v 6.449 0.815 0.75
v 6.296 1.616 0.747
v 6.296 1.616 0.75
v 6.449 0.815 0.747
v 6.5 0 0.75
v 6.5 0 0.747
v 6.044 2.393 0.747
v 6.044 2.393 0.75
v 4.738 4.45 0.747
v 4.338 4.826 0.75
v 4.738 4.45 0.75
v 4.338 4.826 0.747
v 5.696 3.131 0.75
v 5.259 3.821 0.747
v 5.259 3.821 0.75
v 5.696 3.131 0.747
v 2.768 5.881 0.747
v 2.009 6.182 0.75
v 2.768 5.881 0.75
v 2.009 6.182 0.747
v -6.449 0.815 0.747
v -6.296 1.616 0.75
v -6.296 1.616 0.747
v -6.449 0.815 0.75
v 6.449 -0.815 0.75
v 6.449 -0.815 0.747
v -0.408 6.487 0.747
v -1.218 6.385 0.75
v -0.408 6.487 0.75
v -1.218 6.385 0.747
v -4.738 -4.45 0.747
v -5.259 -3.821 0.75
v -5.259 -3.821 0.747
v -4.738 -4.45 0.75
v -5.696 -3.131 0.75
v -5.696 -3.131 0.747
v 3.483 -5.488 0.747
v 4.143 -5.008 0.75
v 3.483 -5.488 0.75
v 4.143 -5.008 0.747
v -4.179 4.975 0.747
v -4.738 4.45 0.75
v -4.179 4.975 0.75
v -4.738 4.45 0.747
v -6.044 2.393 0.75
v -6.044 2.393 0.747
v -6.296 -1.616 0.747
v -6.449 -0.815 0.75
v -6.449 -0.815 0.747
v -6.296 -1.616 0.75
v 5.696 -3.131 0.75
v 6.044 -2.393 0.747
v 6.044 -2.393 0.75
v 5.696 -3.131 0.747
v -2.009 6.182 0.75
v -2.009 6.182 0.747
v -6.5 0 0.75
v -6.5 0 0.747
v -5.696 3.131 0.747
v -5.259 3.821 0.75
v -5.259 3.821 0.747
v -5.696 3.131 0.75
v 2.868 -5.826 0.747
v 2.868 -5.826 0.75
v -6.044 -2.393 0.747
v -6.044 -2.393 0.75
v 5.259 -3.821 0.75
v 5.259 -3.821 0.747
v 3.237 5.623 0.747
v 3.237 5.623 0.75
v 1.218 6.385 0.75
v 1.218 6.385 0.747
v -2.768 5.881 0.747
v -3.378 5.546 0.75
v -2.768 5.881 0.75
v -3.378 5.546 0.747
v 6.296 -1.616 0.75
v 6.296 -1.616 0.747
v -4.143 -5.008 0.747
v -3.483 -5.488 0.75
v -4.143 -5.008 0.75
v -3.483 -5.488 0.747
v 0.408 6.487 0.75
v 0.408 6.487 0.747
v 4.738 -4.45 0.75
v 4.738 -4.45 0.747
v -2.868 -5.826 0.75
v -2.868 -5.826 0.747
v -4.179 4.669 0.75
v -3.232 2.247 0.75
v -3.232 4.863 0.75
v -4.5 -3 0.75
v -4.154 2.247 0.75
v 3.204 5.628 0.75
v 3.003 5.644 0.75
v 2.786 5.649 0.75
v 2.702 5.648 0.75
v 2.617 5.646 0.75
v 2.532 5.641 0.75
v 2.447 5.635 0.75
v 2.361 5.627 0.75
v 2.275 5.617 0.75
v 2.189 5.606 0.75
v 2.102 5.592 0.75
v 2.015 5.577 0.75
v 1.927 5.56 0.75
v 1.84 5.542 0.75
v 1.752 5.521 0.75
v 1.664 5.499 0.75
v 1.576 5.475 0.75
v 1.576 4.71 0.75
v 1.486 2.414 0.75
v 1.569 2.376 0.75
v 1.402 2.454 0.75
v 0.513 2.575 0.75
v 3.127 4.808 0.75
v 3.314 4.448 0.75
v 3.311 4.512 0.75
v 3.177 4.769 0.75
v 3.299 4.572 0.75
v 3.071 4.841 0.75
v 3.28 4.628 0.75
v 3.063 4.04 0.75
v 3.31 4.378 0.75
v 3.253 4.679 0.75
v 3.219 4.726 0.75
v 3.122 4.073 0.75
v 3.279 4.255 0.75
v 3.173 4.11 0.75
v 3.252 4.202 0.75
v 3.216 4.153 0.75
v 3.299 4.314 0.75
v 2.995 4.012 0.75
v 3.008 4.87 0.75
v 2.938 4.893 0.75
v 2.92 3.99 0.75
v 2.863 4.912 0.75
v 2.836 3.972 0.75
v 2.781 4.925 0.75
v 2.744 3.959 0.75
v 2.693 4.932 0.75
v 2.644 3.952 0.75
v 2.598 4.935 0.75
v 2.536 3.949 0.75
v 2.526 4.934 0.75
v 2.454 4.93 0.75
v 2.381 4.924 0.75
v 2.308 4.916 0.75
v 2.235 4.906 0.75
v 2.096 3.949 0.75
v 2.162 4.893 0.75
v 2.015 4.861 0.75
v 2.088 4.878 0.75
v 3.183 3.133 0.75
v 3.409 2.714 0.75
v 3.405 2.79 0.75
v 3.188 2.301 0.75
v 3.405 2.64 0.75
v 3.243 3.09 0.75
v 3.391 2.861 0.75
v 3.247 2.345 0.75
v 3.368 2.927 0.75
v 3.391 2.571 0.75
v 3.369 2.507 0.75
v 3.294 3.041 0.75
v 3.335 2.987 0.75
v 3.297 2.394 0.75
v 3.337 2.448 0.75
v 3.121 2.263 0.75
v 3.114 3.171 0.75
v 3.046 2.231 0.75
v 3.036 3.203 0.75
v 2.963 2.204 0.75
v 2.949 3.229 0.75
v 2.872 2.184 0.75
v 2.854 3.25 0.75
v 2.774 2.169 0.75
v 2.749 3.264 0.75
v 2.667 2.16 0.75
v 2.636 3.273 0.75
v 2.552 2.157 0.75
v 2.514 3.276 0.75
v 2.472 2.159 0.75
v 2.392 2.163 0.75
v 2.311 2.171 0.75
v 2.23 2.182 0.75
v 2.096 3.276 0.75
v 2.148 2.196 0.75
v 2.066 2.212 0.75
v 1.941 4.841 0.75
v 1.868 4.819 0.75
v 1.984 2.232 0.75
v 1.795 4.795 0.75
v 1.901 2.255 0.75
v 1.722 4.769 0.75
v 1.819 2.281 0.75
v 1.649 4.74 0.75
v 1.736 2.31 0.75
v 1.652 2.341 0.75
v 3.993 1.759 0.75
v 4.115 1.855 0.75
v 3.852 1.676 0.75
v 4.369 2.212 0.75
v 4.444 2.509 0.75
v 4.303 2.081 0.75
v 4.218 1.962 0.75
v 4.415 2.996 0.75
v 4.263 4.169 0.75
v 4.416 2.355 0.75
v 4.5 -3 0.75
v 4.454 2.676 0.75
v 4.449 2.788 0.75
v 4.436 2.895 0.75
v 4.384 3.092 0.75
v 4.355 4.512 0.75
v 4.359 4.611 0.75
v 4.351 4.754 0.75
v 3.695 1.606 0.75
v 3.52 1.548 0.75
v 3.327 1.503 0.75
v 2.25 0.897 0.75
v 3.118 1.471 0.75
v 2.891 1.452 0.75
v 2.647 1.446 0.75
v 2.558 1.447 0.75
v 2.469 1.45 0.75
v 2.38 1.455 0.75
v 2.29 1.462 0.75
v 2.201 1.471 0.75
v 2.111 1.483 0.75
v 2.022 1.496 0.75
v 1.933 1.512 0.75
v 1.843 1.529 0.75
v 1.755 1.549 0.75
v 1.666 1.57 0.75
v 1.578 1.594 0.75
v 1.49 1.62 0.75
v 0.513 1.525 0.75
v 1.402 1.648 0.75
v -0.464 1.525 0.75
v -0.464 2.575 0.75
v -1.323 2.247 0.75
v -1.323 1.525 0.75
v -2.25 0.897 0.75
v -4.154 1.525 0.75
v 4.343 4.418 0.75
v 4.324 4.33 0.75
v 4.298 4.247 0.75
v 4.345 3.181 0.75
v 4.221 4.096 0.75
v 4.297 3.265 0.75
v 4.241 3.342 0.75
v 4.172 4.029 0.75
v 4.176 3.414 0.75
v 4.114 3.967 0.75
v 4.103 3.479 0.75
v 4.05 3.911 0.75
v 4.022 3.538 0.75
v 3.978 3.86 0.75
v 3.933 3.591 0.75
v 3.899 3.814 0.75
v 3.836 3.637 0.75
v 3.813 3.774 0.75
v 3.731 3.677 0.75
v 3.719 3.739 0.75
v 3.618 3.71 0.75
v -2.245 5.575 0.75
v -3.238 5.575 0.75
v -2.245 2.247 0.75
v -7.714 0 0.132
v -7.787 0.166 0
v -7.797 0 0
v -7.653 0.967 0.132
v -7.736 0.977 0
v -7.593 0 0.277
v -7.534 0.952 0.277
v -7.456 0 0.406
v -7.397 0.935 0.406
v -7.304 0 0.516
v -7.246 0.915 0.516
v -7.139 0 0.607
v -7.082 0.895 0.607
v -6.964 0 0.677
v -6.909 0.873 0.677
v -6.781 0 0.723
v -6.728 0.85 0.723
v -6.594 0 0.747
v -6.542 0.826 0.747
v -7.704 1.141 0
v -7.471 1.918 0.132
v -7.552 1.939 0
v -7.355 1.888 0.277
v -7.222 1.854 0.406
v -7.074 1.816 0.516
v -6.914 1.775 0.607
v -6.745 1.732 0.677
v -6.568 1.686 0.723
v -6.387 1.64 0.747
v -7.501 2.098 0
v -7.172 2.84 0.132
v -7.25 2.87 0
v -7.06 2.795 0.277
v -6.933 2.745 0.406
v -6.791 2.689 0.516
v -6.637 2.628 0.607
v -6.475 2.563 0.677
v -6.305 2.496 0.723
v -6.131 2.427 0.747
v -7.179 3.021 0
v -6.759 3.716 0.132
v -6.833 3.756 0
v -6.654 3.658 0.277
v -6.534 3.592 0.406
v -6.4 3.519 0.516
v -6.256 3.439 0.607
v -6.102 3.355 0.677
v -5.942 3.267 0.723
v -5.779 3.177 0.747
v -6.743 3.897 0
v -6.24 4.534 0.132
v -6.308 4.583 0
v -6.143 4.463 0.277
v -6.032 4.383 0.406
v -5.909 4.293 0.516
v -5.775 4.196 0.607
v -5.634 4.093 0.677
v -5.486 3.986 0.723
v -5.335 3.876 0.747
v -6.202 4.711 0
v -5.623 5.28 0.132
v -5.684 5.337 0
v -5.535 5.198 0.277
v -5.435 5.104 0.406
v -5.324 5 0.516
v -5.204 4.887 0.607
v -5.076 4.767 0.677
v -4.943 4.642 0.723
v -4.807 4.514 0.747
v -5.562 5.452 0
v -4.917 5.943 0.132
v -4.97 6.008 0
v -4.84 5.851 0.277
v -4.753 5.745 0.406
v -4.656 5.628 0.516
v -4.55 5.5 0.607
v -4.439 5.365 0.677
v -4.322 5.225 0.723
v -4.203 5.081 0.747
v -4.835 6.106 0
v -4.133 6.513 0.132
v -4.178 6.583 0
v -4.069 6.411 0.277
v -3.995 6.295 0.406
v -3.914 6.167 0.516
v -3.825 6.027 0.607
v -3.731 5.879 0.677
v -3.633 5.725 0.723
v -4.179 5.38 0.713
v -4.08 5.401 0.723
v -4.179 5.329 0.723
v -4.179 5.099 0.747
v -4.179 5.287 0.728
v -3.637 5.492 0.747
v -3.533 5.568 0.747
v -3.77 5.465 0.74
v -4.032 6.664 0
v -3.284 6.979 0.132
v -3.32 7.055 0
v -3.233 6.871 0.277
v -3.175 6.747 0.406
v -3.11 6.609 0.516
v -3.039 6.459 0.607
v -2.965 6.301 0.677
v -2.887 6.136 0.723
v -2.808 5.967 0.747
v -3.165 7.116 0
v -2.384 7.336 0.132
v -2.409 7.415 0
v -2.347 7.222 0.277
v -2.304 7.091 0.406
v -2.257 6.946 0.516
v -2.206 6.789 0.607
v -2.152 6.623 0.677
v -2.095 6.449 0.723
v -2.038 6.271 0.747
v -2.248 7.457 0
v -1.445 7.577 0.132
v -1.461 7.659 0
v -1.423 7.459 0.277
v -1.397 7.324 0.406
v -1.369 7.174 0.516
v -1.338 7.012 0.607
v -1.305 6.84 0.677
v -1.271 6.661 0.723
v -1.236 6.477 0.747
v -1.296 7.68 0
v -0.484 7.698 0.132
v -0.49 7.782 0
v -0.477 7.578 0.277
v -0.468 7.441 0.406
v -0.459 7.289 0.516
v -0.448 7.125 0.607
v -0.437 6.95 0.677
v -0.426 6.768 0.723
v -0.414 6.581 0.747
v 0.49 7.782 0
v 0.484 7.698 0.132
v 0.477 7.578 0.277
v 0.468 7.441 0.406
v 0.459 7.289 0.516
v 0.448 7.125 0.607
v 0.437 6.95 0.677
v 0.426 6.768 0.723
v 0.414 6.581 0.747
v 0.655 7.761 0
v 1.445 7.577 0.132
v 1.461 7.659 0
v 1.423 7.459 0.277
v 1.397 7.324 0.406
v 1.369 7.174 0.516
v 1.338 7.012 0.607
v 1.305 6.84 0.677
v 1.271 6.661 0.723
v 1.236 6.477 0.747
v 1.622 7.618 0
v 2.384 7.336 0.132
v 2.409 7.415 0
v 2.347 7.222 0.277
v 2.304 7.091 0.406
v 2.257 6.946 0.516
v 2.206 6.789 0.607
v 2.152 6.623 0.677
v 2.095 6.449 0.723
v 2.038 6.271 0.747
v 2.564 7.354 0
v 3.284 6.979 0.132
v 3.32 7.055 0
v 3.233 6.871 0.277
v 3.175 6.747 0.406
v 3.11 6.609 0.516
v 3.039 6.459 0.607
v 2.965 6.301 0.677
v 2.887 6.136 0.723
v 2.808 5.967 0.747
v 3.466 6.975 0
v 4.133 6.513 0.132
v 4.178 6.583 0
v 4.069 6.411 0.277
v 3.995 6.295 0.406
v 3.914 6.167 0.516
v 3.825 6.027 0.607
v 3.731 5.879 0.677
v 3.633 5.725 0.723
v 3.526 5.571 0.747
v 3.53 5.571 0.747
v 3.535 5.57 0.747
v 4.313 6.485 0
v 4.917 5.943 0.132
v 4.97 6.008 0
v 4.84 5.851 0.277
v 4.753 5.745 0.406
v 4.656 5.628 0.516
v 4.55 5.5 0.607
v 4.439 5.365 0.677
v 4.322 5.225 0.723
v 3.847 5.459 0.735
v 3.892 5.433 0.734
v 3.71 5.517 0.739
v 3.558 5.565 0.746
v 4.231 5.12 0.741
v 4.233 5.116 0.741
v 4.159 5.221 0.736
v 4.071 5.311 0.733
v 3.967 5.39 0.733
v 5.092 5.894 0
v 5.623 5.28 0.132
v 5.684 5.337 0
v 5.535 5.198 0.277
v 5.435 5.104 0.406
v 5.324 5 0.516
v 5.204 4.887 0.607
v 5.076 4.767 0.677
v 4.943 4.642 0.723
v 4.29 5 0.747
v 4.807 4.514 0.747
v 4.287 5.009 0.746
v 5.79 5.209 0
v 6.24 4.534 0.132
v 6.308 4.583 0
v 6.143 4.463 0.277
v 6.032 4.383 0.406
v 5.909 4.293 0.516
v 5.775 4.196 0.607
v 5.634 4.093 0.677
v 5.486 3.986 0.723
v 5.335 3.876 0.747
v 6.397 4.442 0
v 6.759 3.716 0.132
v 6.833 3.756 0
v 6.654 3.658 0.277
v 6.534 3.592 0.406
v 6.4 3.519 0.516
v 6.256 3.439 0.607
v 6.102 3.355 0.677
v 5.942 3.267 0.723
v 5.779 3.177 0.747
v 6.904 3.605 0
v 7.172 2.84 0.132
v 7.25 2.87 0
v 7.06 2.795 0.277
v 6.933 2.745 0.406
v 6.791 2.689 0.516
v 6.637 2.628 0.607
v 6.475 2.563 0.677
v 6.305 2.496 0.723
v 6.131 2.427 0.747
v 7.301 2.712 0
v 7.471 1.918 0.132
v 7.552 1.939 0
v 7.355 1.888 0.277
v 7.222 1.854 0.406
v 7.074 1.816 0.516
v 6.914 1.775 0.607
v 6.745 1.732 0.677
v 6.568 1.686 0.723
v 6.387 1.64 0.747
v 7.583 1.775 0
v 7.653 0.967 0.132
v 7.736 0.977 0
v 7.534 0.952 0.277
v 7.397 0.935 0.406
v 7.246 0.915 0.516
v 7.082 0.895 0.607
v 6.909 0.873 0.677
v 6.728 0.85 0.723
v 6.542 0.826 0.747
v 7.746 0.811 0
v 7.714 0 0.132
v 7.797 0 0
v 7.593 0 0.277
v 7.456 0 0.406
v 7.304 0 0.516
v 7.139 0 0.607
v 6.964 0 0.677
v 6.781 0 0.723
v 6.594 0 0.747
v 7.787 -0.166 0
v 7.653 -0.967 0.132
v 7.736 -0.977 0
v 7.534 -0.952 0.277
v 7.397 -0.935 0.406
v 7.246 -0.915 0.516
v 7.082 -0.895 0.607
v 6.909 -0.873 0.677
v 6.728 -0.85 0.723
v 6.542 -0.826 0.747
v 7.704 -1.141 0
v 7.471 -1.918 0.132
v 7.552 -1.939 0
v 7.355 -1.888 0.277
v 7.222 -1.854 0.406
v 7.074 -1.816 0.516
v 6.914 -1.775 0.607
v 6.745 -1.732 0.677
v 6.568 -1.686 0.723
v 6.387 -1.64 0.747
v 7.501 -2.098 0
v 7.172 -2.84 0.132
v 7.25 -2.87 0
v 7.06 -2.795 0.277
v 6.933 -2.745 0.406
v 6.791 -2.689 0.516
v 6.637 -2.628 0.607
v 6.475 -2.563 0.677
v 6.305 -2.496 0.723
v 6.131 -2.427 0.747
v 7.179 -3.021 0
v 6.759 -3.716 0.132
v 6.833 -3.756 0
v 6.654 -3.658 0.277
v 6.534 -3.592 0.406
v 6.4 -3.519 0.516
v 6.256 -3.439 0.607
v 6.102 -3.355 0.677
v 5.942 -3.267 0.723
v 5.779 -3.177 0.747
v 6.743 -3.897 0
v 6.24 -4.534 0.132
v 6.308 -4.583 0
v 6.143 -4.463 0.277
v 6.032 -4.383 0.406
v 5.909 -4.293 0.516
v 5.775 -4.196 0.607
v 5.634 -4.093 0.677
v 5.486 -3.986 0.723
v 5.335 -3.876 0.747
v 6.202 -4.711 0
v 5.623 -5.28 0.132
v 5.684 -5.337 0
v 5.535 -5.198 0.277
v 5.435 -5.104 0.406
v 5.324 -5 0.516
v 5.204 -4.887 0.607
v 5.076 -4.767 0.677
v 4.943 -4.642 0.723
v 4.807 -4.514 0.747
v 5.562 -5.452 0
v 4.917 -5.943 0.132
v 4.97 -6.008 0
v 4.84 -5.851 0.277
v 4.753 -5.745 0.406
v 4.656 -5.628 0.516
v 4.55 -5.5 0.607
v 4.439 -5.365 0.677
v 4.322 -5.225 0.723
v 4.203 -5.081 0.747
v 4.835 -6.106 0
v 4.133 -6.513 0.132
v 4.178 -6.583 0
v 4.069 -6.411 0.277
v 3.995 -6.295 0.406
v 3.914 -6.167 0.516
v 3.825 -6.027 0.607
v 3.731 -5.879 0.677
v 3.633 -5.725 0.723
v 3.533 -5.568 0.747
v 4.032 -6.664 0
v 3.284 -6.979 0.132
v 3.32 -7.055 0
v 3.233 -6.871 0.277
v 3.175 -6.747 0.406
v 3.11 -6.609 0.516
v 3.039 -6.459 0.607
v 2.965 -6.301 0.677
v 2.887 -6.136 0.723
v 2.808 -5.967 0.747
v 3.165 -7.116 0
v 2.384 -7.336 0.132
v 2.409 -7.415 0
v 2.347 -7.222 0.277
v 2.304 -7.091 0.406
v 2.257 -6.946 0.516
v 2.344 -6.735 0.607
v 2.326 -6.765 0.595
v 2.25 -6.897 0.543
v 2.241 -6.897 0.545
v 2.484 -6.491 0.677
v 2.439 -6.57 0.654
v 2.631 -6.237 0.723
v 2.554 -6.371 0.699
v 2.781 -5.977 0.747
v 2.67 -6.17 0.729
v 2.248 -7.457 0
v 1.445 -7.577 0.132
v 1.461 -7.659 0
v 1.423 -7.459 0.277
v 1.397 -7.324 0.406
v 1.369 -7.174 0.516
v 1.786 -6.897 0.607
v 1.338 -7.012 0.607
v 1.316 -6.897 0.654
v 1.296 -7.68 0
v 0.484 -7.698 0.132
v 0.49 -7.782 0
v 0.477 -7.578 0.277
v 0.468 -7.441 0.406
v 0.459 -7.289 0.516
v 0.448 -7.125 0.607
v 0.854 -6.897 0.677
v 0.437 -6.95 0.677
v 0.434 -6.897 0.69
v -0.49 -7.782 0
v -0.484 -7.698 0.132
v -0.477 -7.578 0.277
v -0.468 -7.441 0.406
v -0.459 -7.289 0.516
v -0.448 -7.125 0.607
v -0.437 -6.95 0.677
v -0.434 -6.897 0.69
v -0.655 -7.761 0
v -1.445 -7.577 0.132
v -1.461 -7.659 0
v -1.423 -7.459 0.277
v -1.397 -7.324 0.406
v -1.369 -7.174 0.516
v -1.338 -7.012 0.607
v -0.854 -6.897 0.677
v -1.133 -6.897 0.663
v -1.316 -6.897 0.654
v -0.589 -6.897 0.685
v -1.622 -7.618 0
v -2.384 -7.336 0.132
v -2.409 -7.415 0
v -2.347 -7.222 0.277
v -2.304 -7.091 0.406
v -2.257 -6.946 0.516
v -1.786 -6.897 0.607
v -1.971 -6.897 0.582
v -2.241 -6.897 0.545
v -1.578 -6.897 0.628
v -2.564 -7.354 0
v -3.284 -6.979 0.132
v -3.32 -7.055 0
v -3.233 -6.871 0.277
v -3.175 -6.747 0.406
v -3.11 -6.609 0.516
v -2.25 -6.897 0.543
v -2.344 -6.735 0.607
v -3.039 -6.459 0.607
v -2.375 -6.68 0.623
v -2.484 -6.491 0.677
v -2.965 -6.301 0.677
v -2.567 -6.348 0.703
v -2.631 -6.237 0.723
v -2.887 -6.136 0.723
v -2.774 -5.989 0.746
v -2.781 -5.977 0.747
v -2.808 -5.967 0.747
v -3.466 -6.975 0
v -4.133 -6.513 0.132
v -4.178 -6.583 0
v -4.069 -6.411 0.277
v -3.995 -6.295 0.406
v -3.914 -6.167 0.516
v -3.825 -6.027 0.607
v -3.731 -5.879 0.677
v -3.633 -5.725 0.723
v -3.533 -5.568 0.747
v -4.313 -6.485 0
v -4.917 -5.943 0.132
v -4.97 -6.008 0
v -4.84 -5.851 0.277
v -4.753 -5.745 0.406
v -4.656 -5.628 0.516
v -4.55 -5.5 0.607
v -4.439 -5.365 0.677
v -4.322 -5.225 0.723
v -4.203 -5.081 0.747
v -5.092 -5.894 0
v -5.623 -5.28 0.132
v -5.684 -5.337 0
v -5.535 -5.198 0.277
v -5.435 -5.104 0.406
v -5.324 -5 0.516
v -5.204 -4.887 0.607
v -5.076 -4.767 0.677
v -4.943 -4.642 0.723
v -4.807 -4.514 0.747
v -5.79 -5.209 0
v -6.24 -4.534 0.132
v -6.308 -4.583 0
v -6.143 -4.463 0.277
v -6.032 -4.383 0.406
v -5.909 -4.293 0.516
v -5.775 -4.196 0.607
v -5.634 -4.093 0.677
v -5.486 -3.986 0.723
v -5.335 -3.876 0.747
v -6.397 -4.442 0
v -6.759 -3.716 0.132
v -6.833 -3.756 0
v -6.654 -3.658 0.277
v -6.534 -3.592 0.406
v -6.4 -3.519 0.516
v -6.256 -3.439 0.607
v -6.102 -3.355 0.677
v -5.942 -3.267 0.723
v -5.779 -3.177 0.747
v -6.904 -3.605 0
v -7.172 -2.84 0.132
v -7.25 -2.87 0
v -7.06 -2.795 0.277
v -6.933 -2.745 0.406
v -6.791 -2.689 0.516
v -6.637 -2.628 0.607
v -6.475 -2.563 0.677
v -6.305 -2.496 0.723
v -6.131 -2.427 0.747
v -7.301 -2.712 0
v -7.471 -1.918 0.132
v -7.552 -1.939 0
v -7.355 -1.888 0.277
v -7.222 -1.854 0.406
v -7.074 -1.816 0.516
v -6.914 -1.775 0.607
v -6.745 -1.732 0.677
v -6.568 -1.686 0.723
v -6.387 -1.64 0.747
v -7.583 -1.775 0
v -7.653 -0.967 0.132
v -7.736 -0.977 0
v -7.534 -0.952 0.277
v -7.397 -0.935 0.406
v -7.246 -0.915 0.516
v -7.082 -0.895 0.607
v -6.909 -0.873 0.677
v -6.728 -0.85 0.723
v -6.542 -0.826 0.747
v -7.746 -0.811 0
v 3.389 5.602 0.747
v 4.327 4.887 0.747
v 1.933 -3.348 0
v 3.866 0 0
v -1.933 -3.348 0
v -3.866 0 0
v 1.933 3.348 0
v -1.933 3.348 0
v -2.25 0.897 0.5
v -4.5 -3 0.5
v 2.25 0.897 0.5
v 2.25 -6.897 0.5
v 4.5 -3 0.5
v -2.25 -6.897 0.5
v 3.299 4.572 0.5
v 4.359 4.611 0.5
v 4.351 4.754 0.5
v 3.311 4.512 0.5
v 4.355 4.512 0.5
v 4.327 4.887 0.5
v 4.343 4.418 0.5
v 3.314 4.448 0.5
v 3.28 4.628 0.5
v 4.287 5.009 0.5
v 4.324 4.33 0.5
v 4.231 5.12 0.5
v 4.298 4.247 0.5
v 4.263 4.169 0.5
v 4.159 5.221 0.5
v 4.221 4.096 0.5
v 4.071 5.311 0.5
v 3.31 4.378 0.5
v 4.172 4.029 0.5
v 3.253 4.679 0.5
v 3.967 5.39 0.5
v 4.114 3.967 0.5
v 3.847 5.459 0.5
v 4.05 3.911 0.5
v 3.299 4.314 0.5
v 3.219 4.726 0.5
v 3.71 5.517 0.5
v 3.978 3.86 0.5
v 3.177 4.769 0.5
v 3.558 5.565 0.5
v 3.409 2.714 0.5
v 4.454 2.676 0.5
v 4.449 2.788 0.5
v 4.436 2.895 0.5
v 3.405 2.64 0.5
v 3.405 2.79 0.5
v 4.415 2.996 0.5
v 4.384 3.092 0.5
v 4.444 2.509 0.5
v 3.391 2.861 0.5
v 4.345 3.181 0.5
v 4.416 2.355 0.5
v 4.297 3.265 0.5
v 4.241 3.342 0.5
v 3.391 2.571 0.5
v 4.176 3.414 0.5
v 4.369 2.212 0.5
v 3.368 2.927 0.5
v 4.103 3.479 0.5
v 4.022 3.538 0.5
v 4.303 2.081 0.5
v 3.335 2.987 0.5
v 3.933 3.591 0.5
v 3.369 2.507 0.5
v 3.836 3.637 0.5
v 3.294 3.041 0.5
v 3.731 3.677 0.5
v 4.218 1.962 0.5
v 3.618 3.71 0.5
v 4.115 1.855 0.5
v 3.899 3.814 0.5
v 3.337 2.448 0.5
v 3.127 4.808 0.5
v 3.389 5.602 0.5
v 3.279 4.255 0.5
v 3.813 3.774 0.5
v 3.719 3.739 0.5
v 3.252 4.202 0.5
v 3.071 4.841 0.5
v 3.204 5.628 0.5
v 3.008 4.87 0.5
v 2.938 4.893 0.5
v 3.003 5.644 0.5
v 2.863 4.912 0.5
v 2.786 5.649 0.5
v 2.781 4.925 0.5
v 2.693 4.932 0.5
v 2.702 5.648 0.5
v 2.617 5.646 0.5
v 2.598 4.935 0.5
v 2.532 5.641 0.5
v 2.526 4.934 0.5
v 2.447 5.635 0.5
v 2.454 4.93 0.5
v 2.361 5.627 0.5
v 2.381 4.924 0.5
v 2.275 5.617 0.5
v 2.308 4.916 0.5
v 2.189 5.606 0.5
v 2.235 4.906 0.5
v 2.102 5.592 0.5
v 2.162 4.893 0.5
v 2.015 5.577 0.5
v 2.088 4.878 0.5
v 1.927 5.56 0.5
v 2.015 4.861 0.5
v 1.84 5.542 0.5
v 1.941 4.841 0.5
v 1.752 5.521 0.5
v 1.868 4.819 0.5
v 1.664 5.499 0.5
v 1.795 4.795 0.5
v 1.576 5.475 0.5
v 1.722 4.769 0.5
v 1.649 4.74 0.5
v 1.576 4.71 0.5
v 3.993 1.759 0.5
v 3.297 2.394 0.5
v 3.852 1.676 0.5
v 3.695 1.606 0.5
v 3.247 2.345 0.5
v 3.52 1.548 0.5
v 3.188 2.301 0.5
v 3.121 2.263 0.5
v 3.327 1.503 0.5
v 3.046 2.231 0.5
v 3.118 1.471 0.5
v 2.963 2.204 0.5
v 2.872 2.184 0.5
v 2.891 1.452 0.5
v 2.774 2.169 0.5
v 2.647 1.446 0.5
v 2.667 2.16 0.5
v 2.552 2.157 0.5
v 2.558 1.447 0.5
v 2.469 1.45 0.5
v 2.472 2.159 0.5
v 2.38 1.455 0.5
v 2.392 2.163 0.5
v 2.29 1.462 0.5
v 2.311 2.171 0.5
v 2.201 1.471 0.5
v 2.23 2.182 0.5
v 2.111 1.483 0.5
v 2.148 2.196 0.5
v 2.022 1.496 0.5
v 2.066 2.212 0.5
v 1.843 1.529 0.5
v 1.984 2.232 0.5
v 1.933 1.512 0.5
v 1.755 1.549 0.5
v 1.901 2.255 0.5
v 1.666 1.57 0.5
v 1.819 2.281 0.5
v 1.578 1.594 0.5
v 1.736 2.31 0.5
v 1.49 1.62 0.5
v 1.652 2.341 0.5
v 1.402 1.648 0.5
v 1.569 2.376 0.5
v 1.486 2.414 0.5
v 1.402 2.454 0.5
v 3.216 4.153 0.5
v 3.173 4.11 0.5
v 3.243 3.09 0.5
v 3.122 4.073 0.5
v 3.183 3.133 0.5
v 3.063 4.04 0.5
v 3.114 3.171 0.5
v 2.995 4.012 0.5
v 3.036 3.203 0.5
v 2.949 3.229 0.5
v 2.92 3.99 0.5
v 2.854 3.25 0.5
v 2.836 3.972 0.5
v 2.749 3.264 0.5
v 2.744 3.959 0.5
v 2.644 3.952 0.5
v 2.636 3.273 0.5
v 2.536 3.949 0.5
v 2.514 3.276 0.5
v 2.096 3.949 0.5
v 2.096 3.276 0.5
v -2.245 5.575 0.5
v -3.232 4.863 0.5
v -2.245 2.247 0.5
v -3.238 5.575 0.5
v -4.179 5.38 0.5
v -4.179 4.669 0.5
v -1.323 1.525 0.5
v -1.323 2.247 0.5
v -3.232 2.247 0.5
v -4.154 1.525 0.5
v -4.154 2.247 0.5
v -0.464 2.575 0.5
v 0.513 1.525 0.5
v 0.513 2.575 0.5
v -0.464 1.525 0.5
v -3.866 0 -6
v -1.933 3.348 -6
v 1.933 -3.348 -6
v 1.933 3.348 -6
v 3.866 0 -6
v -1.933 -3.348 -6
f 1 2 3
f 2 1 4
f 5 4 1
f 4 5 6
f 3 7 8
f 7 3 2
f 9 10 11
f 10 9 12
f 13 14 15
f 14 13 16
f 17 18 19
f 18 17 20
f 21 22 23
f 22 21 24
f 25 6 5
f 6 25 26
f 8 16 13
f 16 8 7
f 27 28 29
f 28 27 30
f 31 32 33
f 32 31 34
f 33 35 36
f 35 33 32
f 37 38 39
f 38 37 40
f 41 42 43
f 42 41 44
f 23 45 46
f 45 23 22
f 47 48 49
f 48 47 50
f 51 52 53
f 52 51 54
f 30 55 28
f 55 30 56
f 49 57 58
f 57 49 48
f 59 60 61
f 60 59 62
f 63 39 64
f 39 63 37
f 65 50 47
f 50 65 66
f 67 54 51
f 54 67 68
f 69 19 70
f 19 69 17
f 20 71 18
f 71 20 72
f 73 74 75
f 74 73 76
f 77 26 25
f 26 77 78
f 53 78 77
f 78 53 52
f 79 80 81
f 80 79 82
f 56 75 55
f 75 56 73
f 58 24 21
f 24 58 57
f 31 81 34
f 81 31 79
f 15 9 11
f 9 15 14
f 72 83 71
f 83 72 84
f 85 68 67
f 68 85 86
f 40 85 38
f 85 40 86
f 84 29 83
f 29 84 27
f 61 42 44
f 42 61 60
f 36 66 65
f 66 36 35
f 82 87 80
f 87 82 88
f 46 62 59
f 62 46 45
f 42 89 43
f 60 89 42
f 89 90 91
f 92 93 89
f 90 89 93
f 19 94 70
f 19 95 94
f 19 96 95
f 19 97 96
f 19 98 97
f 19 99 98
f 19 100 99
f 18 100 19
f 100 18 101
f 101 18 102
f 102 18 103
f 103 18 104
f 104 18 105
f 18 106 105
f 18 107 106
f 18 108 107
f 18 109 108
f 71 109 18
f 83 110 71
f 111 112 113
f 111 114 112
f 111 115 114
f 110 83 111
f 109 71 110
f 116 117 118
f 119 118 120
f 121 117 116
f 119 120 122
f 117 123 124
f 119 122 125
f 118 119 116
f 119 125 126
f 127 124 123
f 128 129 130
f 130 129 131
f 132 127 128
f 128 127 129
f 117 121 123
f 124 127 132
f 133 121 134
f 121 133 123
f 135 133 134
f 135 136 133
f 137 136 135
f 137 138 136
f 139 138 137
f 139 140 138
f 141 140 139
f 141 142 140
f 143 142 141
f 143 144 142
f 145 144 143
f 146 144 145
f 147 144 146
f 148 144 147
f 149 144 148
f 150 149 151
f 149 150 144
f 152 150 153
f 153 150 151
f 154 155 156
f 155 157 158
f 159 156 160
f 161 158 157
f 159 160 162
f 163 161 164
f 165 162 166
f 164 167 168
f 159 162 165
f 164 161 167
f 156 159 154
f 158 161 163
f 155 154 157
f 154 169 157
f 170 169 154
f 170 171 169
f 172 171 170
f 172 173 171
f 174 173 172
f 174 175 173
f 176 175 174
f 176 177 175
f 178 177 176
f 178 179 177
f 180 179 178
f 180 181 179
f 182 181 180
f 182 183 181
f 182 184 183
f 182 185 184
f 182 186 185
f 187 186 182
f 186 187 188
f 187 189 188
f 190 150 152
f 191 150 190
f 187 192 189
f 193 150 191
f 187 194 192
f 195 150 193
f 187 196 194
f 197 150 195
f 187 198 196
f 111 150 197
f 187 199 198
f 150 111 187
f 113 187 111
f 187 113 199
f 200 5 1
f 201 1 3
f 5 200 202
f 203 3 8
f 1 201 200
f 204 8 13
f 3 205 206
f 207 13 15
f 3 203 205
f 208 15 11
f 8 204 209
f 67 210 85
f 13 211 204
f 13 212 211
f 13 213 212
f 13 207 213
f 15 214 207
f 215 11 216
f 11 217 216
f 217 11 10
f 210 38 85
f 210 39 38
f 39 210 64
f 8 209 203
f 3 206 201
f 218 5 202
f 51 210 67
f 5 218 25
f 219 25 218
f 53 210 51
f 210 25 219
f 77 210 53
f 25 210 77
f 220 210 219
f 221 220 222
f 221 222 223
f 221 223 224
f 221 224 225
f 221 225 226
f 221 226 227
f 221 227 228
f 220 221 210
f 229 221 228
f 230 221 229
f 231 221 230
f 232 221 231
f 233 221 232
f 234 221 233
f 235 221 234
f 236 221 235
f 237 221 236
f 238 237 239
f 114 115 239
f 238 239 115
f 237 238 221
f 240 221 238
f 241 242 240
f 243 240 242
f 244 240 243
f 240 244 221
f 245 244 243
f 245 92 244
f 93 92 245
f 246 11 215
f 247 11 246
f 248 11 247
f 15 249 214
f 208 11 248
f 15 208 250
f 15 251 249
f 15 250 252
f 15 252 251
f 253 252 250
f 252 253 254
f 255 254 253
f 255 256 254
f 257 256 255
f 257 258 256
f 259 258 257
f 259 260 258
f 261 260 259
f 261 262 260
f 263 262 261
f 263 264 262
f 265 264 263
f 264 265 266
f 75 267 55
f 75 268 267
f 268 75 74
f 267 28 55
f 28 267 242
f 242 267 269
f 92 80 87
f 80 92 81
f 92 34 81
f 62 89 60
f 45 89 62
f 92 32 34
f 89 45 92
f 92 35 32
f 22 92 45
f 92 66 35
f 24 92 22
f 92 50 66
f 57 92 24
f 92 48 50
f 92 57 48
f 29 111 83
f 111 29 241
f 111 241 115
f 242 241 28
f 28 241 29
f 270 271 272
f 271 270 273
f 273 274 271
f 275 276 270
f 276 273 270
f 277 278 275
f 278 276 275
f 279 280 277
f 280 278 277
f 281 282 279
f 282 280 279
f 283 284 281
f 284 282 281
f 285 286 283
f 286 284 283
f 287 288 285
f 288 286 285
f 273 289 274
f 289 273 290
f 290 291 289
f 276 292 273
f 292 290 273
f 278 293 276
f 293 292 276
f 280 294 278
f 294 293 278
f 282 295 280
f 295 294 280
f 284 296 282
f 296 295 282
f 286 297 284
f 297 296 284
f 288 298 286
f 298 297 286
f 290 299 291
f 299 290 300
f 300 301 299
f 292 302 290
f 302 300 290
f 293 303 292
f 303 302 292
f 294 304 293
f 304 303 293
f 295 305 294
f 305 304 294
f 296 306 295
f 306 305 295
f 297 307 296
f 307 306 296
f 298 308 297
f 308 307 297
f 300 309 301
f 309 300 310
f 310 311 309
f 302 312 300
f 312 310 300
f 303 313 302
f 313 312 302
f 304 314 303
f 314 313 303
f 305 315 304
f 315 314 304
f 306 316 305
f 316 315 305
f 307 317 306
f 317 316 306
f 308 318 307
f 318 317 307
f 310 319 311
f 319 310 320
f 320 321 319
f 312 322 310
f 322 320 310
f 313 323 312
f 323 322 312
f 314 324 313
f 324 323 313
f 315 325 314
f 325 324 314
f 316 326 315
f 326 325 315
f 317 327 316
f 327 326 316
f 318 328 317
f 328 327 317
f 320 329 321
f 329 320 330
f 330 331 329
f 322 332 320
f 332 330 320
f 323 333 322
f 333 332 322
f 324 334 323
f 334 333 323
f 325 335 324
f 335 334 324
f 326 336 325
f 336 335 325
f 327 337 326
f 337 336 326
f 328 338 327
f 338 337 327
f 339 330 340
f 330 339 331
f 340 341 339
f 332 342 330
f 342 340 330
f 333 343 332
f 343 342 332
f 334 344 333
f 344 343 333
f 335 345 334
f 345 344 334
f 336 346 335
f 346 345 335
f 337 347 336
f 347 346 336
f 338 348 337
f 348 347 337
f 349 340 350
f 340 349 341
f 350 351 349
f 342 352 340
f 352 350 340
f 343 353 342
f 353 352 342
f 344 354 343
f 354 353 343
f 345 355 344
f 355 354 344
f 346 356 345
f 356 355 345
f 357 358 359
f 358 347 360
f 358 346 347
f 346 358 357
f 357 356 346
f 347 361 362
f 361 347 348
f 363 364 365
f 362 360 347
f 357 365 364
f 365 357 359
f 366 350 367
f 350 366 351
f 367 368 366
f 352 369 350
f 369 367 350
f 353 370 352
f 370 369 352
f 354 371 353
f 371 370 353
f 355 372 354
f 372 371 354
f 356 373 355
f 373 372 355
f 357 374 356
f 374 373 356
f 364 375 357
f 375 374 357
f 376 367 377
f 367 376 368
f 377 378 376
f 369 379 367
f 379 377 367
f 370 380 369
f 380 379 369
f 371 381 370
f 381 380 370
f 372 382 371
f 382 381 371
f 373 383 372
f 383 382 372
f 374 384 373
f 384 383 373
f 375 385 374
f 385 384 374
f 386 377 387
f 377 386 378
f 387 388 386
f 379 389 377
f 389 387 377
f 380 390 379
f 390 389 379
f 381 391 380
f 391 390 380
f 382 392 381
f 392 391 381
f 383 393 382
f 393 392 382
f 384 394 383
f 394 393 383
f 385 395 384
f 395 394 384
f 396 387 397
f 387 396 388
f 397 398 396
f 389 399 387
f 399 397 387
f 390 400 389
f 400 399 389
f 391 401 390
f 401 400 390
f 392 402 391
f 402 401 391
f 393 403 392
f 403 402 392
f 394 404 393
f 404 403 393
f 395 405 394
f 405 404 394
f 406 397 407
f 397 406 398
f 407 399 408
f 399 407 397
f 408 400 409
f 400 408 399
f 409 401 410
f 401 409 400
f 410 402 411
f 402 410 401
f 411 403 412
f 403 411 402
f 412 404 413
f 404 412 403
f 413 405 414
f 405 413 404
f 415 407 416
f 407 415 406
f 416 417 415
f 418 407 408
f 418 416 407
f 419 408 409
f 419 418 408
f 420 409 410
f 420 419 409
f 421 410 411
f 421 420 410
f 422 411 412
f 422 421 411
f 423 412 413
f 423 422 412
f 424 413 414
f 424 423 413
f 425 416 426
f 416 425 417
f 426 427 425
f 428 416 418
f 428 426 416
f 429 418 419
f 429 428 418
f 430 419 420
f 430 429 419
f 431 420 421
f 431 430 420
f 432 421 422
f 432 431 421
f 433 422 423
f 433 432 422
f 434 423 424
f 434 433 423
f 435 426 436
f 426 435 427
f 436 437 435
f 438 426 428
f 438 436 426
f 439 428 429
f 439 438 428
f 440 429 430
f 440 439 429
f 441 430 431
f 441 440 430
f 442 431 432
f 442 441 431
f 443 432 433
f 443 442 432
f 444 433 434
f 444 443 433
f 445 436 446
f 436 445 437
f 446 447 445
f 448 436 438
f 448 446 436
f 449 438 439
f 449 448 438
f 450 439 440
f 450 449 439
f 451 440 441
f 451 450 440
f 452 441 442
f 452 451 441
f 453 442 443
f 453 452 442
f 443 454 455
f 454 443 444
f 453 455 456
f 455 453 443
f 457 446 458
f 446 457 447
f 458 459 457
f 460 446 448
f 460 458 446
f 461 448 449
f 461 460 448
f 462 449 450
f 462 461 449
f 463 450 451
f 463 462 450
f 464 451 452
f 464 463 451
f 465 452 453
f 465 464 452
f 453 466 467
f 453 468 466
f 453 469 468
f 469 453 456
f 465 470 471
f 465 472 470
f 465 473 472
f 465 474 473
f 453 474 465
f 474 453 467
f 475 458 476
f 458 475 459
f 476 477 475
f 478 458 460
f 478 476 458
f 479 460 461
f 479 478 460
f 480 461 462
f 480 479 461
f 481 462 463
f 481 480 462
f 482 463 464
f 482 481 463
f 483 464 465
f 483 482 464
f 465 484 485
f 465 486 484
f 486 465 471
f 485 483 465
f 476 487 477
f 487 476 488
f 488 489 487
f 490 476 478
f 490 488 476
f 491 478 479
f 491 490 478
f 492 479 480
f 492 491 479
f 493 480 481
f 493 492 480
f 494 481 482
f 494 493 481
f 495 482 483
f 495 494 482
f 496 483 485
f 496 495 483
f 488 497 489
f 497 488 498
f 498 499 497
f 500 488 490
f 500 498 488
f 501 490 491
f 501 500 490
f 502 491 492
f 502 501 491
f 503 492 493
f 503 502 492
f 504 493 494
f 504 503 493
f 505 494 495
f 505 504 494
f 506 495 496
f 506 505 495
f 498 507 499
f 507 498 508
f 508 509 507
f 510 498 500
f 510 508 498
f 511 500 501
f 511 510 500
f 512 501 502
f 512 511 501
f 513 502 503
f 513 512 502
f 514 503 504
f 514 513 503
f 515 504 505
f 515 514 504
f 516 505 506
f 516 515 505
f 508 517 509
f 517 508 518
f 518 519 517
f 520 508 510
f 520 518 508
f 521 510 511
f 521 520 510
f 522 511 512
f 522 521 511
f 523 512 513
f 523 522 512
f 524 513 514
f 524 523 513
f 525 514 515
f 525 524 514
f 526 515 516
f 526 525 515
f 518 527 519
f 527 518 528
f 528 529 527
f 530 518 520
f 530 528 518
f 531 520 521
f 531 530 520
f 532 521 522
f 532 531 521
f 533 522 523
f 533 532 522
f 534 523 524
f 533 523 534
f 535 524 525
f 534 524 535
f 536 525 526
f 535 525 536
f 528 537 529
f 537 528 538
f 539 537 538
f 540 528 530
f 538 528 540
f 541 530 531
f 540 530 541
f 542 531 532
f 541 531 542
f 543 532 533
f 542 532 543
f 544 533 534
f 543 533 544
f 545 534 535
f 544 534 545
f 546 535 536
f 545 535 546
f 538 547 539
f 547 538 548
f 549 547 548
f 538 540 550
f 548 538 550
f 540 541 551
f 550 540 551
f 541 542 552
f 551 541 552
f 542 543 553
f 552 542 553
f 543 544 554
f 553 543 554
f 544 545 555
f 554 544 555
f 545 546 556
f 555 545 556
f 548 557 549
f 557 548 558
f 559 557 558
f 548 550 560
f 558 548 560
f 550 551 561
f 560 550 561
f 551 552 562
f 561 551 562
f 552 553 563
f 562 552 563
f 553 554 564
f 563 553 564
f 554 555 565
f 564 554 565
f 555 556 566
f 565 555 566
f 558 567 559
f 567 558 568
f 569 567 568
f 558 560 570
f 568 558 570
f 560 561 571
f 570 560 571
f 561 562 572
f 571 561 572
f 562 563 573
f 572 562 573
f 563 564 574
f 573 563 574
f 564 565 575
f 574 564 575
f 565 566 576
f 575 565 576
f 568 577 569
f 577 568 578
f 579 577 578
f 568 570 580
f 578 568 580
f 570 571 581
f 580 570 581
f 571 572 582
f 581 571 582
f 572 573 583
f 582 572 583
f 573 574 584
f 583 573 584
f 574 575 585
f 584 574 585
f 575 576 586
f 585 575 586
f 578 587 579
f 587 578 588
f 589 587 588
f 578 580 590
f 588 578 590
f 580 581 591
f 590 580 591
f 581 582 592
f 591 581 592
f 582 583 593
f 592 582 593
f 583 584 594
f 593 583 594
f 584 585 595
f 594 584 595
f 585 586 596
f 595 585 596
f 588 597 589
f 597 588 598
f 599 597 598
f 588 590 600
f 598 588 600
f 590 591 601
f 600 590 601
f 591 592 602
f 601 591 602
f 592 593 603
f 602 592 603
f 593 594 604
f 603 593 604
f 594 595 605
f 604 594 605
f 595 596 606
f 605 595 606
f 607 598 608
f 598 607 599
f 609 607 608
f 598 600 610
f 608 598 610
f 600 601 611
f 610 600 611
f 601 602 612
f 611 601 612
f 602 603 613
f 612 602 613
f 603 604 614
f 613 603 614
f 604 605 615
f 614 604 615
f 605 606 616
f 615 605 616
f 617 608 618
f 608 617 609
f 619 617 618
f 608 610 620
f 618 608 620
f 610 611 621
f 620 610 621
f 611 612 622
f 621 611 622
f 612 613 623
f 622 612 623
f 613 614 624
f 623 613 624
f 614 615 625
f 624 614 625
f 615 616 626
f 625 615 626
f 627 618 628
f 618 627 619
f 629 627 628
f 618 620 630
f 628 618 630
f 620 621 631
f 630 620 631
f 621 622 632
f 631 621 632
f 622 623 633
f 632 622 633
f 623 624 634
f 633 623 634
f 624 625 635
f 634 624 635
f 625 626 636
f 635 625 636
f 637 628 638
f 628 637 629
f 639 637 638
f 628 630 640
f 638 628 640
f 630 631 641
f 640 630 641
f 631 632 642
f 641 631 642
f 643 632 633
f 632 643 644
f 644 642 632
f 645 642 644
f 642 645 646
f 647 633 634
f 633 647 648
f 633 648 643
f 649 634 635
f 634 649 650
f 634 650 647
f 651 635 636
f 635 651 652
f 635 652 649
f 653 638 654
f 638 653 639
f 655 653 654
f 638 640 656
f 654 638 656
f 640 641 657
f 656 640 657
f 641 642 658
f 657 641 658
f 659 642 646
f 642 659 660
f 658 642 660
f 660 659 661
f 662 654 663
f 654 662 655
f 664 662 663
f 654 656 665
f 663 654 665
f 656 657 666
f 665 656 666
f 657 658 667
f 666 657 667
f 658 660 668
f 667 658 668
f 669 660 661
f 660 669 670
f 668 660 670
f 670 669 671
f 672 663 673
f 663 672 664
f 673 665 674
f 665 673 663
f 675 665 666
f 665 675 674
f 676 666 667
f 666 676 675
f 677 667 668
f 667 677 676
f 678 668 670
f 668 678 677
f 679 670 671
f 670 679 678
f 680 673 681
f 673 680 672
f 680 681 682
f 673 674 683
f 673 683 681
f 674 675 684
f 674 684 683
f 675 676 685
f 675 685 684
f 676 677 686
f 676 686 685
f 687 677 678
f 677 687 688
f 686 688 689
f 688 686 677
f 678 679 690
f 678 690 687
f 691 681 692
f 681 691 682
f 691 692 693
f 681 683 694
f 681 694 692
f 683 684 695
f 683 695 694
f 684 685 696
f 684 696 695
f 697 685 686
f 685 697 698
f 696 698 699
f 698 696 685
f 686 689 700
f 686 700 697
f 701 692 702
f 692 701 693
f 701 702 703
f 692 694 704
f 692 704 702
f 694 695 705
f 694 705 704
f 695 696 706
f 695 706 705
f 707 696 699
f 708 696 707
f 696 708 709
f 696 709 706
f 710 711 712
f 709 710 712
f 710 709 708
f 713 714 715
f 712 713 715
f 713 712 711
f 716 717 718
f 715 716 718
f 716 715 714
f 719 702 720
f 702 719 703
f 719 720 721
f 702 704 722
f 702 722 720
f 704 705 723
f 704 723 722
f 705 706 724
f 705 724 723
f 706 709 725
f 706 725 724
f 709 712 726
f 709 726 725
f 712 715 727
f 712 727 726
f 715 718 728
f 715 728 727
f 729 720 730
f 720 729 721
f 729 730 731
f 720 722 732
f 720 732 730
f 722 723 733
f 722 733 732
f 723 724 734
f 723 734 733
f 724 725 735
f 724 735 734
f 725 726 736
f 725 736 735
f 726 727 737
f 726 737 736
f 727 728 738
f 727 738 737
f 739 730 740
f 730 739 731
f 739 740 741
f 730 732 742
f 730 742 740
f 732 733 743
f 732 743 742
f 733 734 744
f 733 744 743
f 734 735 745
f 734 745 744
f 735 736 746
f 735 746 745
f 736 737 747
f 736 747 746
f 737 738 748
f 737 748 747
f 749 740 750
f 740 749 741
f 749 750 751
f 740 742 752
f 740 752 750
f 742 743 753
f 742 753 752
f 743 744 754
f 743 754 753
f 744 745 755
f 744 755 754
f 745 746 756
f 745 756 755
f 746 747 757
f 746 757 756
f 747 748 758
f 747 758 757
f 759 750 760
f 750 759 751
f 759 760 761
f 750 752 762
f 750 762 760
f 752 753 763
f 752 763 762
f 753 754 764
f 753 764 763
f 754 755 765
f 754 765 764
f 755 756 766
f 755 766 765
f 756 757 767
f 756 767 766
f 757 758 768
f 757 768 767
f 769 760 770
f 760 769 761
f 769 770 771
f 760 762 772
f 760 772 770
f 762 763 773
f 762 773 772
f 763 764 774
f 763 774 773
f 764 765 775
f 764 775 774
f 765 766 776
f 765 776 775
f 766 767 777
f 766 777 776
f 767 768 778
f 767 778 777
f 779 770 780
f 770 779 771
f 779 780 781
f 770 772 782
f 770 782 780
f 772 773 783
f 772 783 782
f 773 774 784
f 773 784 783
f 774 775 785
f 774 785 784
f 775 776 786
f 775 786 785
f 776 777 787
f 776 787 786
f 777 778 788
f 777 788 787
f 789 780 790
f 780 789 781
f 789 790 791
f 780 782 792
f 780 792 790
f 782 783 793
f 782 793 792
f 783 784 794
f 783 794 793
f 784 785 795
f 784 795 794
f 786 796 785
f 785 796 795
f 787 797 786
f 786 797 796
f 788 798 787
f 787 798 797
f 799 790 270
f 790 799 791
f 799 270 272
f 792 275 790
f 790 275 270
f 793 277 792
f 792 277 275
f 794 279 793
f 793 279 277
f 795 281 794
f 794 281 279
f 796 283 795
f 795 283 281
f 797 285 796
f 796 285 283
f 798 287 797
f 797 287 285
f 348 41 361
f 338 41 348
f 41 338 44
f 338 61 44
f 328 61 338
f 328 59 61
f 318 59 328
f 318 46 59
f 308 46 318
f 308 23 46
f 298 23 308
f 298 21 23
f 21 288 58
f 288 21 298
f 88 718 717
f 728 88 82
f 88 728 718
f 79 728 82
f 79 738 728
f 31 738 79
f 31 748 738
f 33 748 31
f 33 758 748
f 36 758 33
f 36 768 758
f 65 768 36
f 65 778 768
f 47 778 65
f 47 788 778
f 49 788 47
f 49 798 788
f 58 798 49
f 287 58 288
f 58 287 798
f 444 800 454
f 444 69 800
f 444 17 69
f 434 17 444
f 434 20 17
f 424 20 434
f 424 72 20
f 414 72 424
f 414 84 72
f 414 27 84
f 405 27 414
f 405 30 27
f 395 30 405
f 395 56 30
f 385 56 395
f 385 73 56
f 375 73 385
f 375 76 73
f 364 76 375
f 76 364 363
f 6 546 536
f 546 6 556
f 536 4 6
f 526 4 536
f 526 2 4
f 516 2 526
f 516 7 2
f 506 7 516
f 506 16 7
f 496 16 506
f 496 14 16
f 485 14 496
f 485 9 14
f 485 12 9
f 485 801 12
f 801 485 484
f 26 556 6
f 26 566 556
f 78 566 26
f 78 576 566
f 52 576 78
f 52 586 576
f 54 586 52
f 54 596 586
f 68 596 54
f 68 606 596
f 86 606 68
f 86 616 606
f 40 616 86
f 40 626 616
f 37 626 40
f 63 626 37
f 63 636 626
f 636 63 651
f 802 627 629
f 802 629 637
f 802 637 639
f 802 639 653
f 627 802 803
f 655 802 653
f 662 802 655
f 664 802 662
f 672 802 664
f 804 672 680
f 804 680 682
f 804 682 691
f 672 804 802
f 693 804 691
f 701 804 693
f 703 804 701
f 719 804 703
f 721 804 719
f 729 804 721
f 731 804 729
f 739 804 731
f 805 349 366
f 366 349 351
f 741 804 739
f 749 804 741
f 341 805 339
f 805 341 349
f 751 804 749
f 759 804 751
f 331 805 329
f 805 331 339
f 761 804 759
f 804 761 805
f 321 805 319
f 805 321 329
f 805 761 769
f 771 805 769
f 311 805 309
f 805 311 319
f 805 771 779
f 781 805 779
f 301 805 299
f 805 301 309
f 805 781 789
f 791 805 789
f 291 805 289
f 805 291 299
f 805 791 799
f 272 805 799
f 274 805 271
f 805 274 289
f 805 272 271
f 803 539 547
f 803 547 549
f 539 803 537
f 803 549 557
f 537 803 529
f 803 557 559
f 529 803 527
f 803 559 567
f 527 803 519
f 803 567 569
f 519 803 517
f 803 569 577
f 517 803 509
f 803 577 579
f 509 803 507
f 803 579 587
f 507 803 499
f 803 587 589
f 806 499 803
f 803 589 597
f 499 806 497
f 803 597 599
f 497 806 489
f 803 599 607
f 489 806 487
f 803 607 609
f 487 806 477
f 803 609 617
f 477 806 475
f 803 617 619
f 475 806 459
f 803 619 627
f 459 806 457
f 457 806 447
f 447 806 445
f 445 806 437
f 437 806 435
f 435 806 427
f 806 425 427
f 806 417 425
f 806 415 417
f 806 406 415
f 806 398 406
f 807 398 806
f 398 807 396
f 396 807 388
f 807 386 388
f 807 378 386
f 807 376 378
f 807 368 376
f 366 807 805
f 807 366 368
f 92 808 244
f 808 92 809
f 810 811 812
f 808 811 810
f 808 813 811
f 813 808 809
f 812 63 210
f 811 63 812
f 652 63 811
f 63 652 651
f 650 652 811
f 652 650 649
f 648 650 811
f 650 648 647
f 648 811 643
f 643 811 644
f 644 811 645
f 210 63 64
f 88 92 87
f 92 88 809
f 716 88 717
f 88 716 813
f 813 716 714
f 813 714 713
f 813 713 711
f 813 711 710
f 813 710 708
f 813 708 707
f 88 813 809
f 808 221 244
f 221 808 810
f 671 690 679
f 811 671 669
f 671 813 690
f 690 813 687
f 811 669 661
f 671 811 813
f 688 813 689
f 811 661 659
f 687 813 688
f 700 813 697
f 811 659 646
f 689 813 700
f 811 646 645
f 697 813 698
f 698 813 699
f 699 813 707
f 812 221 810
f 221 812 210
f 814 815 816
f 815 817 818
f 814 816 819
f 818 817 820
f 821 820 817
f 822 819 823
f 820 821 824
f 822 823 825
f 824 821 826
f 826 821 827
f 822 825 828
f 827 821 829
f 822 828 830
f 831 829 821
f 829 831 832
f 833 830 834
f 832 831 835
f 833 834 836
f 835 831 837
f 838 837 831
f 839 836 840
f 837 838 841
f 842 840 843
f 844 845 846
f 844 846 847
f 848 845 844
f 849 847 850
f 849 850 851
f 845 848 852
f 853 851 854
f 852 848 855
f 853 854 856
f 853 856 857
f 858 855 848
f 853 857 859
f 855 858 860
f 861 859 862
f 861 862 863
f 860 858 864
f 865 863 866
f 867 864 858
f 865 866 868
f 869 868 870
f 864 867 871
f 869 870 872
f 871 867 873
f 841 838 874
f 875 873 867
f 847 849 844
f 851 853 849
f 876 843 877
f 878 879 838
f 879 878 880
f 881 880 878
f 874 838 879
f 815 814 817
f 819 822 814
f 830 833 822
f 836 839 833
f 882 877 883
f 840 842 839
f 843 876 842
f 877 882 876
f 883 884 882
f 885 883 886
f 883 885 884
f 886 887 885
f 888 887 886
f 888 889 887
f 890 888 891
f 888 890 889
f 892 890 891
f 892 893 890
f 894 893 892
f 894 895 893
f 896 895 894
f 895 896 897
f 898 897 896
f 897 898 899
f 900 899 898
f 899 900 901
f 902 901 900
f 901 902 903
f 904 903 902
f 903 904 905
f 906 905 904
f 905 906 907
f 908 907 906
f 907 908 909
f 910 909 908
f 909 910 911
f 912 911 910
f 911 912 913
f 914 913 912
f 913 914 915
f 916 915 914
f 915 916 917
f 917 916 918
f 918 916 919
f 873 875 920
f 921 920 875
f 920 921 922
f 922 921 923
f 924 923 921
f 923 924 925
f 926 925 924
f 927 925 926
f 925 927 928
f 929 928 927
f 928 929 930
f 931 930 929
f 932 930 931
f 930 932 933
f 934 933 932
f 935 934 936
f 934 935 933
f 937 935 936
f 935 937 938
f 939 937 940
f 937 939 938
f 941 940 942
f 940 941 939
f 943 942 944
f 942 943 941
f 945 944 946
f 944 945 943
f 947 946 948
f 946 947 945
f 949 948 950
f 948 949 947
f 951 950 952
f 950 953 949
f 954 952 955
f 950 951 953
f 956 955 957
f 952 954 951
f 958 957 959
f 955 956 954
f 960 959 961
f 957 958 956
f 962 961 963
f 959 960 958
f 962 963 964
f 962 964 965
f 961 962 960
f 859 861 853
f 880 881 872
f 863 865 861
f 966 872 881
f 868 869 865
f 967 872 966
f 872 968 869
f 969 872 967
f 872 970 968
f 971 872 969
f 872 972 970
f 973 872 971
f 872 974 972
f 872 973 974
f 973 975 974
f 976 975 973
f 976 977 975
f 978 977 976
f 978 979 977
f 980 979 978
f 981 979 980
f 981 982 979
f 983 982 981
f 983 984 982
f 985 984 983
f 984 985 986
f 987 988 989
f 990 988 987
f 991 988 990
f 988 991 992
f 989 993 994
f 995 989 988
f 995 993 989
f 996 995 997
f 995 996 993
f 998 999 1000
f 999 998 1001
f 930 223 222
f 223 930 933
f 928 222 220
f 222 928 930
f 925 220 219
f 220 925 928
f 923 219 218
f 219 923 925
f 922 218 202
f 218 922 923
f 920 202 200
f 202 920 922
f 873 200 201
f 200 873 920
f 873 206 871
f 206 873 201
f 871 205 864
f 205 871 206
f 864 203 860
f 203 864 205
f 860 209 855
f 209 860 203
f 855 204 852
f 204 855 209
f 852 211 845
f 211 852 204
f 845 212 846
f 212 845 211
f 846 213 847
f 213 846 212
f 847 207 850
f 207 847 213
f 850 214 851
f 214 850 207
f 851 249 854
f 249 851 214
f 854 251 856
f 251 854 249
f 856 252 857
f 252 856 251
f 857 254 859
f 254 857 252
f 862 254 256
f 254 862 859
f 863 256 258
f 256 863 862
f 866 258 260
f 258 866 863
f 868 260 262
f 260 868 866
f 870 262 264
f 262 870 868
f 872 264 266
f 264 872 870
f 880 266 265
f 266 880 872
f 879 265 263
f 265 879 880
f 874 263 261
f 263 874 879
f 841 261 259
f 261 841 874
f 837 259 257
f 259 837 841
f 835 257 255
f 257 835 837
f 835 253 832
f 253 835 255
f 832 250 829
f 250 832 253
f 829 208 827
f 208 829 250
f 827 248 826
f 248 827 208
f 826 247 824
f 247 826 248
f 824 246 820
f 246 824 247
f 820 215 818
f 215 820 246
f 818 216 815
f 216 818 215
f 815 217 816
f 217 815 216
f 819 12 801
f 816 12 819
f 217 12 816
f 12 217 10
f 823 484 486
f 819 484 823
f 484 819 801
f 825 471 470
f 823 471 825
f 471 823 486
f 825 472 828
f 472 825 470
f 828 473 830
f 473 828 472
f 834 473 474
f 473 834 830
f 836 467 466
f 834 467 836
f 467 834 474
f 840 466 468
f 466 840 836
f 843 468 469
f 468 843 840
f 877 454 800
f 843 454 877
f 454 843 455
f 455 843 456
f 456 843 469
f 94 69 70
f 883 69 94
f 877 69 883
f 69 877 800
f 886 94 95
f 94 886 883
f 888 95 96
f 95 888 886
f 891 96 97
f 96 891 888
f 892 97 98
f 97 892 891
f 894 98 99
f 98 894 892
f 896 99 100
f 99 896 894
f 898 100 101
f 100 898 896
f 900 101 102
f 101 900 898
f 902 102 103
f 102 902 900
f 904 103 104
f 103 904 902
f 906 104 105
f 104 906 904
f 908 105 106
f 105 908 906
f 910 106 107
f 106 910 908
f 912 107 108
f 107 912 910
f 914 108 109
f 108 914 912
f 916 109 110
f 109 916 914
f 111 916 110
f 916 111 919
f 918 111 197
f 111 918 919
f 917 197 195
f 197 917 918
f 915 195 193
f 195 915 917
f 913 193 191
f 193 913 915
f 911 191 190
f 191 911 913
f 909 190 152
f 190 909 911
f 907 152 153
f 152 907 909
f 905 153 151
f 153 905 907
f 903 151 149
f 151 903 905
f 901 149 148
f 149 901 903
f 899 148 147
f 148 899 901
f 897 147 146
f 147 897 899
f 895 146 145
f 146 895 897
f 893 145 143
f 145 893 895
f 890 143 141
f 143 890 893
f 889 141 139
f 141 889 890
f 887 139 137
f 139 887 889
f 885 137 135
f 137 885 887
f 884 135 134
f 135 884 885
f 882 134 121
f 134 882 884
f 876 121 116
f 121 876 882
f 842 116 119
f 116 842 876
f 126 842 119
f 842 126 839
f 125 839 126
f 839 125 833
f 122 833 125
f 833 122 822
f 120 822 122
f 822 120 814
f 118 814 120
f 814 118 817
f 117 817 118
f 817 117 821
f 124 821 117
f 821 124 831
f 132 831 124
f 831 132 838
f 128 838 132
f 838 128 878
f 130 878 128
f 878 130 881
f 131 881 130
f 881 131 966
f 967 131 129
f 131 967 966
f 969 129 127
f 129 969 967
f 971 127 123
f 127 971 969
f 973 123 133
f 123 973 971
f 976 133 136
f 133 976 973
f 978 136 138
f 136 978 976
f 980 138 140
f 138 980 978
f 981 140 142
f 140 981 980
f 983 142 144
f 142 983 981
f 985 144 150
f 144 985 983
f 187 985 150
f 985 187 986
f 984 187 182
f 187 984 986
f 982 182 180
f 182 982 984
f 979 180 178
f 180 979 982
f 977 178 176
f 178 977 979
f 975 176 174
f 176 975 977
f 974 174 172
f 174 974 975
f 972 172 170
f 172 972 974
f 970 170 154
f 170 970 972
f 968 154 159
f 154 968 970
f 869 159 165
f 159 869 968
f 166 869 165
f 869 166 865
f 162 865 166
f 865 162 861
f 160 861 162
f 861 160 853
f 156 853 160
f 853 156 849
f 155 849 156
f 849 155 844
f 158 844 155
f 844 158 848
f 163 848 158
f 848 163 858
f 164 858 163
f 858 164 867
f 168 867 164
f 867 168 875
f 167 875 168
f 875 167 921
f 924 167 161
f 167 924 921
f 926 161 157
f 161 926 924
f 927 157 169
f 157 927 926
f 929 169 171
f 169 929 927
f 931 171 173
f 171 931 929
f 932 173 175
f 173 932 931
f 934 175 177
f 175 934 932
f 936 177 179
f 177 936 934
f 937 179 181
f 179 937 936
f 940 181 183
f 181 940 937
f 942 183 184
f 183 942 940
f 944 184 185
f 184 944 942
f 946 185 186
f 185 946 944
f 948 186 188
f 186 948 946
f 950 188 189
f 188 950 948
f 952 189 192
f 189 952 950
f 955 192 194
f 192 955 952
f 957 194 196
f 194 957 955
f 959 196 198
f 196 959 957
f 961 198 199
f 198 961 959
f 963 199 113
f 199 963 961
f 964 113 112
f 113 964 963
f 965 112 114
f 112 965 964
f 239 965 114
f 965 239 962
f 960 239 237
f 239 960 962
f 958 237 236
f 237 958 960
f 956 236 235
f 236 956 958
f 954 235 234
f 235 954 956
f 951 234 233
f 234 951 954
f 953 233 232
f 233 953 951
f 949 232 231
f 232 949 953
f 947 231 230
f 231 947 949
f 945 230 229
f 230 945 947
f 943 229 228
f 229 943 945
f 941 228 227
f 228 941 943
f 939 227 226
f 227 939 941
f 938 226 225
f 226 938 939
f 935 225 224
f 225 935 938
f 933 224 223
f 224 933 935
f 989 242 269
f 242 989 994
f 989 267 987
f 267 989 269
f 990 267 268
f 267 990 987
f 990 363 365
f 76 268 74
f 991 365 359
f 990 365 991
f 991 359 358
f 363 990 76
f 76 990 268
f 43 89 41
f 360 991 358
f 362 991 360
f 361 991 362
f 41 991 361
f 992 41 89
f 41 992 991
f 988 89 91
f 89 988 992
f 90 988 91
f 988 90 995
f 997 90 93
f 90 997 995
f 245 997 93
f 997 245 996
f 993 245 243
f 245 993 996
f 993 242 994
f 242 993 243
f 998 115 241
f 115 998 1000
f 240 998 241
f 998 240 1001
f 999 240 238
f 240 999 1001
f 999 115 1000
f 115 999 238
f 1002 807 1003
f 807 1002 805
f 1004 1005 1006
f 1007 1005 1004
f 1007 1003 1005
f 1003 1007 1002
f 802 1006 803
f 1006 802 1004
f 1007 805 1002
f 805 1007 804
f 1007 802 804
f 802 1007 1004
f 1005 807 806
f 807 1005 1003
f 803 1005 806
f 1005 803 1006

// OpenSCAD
$fn = 50;


union() {
	difference() {
		union() {
			translate(v = [0, 0, -0.7500000000]) {
				cylinder(h = 1.5000000000, r = 6.5000000000);
			}
			translate(v = [0, 0, -0.7500000000]) {
				rotate_extrude(angle = 360) {
					translate(v = [6.5000000000, 0, 0]) {
						circle(r = 1.5000000000);
					}
				}
			}
		}
		union() {
			translate(v = [-25.0000000000, -25.0000000000, -50]) {
				cube(size = [50, 50, 50]);
			}
			translate(v = [0, -3, 0.5000000000]) {
				#linear_extrude(height = 0.2500000000) {
					polygon(points = [[4.5000000000, 0.0000000000], [2.2500000000, 3.8971143170], [-2.2500000000, 3.8971143170], [-4.5000000000, 0.0000000000], [-2.2500000000, -3.8971143170], [2.2500000000, -3.8971143170]]);
				}
			}
			#translate(v = [0, 3.5000000000, 0.5000000000]) {
				linear_extrude(height = 0.2500000000) {
					text(font = "SegoiUI:Bold", halign = "center", size = 4, text = "1.3", valign = "center");
				}
			}
		}
	}
	union() {
		translate(v = [0, 0, -6]) {
			linear_extrude(height = 6) {
				polygon(points = [[3.8658550000, 0.0000000000], [1.9329275000, 3.3479286373], [-1.9329275000, 3.3479286373], [-3.8658550000, 0.0000000000], [-1.9329275000, -3.3479286373], [1.9329275000, -3.3479286373]]);
			}
		}
	}
}
